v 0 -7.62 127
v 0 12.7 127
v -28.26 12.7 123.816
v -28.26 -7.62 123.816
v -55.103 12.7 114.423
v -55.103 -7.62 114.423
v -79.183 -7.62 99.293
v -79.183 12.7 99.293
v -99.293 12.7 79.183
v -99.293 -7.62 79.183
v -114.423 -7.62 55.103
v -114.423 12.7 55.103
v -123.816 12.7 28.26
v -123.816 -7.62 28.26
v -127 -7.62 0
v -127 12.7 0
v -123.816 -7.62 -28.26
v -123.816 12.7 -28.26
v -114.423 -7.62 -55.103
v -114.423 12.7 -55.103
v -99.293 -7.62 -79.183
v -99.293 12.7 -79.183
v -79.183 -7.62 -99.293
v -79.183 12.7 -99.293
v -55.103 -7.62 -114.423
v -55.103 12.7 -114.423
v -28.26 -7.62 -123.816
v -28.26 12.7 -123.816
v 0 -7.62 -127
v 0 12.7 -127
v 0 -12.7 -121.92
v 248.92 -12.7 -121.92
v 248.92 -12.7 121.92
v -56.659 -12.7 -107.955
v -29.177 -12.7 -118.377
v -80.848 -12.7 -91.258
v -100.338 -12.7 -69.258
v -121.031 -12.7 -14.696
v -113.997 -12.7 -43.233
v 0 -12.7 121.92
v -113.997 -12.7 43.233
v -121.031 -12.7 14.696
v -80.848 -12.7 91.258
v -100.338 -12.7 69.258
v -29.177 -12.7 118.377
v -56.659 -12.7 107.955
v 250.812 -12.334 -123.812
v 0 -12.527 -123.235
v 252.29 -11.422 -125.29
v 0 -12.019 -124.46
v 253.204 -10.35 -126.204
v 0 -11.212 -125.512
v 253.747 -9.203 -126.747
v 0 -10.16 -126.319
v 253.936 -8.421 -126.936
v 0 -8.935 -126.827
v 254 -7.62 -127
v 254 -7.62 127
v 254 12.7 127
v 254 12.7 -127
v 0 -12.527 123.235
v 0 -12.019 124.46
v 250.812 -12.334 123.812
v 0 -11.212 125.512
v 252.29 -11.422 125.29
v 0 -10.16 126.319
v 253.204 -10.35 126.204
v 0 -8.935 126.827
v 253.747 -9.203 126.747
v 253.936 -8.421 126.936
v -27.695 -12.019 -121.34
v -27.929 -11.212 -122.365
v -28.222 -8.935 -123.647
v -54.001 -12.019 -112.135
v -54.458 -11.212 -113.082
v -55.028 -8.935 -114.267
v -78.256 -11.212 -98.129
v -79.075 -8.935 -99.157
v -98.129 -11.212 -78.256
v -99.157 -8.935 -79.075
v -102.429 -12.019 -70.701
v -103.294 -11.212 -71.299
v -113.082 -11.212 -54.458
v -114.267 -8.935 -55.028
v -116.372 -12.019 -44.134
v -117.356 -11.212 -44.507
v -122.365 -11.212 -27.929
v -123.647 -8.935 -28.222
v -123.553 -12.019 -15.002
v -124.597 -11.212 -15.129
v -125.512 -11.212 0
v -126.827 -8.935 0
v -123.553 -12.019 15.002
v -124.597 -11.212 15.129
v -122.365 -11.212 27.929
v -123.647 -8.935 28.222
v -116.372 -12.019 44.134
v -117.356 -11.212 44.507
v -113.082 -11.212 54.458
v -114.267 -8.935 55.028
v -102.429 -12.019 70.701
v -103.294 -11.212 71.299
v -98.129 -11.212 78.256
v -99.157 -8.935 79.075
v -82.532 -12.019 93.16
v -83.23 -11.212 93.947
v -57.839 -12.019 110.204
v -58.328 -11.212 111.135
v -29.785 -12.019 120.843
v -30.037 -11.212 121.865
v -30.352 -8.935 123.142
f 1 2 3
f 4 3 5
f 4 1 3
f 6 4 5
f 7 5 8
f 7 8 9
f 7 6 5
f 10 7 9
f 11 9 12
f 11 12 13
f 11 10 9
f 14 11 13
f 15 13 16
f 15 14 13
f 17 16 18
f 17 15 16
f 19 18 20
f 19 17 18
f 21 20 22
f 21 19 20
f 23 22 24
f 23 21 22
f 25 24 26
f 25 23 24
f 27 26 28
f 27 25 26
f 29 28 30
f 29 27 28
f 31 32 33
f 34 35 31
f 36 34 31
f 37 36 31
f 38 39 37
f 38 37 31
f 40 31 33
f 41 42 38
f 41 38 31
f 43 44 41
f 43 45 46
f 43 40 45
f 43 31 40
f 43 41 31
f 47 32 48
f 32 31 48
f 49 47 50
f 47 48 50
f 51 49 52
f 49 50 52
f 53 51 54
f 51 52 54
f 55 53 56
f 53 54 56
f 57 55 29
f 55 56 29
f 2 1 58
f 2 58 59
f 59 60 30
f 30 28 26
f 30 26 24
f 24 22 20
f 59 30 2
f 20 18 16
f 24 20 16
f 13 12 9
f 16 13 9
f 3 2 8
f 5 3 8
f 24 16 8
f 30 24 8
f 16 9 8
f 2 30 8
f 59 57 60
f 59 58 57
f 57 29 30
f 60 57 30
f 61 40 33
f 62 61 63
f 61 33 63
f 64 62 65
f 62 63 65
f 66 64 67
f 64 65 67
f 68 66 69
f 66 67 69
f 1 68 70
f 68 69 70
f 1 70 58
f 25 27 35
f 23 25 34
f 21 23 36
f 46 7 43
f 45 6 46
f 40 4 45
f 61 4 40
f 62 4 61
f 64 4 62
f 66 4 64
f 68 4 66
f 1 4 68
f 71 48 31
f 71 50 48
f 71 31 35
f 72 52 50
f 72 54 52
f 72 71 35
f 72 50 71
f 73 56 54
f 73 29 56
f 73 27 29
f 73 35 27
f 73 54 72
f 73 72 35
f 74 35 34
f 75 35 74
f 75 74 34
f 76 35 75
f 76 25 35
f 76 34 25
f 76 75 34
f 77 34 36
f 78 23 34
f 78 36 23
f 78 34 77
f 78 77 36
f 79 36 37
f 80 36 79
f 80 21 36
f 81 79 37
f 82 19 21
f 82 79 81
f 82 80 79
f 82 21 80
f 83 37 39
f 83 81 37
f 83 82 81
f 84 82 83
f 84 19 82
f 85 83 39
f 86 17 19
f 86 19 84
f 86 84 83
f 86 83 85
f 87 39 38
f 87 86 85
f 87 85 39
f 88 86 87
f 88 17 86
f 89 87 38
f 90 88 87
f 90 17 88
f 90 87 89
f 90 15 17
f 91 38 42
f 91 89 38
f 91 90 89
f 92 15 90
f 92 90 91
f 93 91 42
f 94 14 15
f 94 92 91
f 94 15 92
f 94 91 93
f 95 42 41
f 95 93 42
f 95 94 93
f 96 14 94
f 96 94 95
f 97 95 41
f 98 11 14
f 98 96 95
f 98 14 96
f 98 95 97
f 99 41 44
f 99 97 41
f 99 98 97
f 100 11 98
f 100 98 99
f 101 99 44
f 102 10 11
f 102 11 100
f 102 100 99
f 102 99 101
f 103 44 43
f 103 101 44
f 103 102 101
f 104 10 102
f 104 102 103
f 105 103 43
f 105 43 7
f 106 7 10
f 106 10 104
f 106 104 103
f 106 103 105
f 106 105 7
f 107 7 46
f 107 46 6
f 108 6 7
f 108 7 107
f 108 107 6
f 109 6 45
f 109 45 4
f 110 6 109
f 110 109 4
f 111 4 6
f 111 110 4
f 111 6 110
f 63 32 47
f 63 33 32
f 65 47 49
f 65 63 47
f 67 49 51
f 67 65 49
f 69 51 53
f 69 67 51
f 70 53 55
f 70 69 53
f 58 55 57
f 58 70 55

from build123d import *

# Parameters (mm, degrees)
F1_DEPTH = 12.7
F2_W     = 25.4
F2_H     = 254
F3_DEPTH = 254
F4_R     = 5.08


with BuildPart() as f1:
    # F0 (on Front) → F1 (new body, symmetric)
    with BuildSketch(Plane.XZ):
        with BuildLine():
            Line((0, -127), (0, 127))
            ThreePointArc((0, 127), (-127, 0), (0, -127))
        make_face()
    extrude(amount=F1_DEPTH, both=True)

    # F2 (on face) → F3 (join)
    with BuildSketch(Plane.YZ):
        Rectangle(F2_W, F2_H)
    extrude(amount=F3_DEPTH)

    # F4
    f4_edges = [f1.edges().sort_by_distance(p)[0] for p in [
        (127, -12.7, 127),
        (254, -12.7, 0),
    ]]
    fillet(f4_edges, radius=F4_R)


solid = f1.part
